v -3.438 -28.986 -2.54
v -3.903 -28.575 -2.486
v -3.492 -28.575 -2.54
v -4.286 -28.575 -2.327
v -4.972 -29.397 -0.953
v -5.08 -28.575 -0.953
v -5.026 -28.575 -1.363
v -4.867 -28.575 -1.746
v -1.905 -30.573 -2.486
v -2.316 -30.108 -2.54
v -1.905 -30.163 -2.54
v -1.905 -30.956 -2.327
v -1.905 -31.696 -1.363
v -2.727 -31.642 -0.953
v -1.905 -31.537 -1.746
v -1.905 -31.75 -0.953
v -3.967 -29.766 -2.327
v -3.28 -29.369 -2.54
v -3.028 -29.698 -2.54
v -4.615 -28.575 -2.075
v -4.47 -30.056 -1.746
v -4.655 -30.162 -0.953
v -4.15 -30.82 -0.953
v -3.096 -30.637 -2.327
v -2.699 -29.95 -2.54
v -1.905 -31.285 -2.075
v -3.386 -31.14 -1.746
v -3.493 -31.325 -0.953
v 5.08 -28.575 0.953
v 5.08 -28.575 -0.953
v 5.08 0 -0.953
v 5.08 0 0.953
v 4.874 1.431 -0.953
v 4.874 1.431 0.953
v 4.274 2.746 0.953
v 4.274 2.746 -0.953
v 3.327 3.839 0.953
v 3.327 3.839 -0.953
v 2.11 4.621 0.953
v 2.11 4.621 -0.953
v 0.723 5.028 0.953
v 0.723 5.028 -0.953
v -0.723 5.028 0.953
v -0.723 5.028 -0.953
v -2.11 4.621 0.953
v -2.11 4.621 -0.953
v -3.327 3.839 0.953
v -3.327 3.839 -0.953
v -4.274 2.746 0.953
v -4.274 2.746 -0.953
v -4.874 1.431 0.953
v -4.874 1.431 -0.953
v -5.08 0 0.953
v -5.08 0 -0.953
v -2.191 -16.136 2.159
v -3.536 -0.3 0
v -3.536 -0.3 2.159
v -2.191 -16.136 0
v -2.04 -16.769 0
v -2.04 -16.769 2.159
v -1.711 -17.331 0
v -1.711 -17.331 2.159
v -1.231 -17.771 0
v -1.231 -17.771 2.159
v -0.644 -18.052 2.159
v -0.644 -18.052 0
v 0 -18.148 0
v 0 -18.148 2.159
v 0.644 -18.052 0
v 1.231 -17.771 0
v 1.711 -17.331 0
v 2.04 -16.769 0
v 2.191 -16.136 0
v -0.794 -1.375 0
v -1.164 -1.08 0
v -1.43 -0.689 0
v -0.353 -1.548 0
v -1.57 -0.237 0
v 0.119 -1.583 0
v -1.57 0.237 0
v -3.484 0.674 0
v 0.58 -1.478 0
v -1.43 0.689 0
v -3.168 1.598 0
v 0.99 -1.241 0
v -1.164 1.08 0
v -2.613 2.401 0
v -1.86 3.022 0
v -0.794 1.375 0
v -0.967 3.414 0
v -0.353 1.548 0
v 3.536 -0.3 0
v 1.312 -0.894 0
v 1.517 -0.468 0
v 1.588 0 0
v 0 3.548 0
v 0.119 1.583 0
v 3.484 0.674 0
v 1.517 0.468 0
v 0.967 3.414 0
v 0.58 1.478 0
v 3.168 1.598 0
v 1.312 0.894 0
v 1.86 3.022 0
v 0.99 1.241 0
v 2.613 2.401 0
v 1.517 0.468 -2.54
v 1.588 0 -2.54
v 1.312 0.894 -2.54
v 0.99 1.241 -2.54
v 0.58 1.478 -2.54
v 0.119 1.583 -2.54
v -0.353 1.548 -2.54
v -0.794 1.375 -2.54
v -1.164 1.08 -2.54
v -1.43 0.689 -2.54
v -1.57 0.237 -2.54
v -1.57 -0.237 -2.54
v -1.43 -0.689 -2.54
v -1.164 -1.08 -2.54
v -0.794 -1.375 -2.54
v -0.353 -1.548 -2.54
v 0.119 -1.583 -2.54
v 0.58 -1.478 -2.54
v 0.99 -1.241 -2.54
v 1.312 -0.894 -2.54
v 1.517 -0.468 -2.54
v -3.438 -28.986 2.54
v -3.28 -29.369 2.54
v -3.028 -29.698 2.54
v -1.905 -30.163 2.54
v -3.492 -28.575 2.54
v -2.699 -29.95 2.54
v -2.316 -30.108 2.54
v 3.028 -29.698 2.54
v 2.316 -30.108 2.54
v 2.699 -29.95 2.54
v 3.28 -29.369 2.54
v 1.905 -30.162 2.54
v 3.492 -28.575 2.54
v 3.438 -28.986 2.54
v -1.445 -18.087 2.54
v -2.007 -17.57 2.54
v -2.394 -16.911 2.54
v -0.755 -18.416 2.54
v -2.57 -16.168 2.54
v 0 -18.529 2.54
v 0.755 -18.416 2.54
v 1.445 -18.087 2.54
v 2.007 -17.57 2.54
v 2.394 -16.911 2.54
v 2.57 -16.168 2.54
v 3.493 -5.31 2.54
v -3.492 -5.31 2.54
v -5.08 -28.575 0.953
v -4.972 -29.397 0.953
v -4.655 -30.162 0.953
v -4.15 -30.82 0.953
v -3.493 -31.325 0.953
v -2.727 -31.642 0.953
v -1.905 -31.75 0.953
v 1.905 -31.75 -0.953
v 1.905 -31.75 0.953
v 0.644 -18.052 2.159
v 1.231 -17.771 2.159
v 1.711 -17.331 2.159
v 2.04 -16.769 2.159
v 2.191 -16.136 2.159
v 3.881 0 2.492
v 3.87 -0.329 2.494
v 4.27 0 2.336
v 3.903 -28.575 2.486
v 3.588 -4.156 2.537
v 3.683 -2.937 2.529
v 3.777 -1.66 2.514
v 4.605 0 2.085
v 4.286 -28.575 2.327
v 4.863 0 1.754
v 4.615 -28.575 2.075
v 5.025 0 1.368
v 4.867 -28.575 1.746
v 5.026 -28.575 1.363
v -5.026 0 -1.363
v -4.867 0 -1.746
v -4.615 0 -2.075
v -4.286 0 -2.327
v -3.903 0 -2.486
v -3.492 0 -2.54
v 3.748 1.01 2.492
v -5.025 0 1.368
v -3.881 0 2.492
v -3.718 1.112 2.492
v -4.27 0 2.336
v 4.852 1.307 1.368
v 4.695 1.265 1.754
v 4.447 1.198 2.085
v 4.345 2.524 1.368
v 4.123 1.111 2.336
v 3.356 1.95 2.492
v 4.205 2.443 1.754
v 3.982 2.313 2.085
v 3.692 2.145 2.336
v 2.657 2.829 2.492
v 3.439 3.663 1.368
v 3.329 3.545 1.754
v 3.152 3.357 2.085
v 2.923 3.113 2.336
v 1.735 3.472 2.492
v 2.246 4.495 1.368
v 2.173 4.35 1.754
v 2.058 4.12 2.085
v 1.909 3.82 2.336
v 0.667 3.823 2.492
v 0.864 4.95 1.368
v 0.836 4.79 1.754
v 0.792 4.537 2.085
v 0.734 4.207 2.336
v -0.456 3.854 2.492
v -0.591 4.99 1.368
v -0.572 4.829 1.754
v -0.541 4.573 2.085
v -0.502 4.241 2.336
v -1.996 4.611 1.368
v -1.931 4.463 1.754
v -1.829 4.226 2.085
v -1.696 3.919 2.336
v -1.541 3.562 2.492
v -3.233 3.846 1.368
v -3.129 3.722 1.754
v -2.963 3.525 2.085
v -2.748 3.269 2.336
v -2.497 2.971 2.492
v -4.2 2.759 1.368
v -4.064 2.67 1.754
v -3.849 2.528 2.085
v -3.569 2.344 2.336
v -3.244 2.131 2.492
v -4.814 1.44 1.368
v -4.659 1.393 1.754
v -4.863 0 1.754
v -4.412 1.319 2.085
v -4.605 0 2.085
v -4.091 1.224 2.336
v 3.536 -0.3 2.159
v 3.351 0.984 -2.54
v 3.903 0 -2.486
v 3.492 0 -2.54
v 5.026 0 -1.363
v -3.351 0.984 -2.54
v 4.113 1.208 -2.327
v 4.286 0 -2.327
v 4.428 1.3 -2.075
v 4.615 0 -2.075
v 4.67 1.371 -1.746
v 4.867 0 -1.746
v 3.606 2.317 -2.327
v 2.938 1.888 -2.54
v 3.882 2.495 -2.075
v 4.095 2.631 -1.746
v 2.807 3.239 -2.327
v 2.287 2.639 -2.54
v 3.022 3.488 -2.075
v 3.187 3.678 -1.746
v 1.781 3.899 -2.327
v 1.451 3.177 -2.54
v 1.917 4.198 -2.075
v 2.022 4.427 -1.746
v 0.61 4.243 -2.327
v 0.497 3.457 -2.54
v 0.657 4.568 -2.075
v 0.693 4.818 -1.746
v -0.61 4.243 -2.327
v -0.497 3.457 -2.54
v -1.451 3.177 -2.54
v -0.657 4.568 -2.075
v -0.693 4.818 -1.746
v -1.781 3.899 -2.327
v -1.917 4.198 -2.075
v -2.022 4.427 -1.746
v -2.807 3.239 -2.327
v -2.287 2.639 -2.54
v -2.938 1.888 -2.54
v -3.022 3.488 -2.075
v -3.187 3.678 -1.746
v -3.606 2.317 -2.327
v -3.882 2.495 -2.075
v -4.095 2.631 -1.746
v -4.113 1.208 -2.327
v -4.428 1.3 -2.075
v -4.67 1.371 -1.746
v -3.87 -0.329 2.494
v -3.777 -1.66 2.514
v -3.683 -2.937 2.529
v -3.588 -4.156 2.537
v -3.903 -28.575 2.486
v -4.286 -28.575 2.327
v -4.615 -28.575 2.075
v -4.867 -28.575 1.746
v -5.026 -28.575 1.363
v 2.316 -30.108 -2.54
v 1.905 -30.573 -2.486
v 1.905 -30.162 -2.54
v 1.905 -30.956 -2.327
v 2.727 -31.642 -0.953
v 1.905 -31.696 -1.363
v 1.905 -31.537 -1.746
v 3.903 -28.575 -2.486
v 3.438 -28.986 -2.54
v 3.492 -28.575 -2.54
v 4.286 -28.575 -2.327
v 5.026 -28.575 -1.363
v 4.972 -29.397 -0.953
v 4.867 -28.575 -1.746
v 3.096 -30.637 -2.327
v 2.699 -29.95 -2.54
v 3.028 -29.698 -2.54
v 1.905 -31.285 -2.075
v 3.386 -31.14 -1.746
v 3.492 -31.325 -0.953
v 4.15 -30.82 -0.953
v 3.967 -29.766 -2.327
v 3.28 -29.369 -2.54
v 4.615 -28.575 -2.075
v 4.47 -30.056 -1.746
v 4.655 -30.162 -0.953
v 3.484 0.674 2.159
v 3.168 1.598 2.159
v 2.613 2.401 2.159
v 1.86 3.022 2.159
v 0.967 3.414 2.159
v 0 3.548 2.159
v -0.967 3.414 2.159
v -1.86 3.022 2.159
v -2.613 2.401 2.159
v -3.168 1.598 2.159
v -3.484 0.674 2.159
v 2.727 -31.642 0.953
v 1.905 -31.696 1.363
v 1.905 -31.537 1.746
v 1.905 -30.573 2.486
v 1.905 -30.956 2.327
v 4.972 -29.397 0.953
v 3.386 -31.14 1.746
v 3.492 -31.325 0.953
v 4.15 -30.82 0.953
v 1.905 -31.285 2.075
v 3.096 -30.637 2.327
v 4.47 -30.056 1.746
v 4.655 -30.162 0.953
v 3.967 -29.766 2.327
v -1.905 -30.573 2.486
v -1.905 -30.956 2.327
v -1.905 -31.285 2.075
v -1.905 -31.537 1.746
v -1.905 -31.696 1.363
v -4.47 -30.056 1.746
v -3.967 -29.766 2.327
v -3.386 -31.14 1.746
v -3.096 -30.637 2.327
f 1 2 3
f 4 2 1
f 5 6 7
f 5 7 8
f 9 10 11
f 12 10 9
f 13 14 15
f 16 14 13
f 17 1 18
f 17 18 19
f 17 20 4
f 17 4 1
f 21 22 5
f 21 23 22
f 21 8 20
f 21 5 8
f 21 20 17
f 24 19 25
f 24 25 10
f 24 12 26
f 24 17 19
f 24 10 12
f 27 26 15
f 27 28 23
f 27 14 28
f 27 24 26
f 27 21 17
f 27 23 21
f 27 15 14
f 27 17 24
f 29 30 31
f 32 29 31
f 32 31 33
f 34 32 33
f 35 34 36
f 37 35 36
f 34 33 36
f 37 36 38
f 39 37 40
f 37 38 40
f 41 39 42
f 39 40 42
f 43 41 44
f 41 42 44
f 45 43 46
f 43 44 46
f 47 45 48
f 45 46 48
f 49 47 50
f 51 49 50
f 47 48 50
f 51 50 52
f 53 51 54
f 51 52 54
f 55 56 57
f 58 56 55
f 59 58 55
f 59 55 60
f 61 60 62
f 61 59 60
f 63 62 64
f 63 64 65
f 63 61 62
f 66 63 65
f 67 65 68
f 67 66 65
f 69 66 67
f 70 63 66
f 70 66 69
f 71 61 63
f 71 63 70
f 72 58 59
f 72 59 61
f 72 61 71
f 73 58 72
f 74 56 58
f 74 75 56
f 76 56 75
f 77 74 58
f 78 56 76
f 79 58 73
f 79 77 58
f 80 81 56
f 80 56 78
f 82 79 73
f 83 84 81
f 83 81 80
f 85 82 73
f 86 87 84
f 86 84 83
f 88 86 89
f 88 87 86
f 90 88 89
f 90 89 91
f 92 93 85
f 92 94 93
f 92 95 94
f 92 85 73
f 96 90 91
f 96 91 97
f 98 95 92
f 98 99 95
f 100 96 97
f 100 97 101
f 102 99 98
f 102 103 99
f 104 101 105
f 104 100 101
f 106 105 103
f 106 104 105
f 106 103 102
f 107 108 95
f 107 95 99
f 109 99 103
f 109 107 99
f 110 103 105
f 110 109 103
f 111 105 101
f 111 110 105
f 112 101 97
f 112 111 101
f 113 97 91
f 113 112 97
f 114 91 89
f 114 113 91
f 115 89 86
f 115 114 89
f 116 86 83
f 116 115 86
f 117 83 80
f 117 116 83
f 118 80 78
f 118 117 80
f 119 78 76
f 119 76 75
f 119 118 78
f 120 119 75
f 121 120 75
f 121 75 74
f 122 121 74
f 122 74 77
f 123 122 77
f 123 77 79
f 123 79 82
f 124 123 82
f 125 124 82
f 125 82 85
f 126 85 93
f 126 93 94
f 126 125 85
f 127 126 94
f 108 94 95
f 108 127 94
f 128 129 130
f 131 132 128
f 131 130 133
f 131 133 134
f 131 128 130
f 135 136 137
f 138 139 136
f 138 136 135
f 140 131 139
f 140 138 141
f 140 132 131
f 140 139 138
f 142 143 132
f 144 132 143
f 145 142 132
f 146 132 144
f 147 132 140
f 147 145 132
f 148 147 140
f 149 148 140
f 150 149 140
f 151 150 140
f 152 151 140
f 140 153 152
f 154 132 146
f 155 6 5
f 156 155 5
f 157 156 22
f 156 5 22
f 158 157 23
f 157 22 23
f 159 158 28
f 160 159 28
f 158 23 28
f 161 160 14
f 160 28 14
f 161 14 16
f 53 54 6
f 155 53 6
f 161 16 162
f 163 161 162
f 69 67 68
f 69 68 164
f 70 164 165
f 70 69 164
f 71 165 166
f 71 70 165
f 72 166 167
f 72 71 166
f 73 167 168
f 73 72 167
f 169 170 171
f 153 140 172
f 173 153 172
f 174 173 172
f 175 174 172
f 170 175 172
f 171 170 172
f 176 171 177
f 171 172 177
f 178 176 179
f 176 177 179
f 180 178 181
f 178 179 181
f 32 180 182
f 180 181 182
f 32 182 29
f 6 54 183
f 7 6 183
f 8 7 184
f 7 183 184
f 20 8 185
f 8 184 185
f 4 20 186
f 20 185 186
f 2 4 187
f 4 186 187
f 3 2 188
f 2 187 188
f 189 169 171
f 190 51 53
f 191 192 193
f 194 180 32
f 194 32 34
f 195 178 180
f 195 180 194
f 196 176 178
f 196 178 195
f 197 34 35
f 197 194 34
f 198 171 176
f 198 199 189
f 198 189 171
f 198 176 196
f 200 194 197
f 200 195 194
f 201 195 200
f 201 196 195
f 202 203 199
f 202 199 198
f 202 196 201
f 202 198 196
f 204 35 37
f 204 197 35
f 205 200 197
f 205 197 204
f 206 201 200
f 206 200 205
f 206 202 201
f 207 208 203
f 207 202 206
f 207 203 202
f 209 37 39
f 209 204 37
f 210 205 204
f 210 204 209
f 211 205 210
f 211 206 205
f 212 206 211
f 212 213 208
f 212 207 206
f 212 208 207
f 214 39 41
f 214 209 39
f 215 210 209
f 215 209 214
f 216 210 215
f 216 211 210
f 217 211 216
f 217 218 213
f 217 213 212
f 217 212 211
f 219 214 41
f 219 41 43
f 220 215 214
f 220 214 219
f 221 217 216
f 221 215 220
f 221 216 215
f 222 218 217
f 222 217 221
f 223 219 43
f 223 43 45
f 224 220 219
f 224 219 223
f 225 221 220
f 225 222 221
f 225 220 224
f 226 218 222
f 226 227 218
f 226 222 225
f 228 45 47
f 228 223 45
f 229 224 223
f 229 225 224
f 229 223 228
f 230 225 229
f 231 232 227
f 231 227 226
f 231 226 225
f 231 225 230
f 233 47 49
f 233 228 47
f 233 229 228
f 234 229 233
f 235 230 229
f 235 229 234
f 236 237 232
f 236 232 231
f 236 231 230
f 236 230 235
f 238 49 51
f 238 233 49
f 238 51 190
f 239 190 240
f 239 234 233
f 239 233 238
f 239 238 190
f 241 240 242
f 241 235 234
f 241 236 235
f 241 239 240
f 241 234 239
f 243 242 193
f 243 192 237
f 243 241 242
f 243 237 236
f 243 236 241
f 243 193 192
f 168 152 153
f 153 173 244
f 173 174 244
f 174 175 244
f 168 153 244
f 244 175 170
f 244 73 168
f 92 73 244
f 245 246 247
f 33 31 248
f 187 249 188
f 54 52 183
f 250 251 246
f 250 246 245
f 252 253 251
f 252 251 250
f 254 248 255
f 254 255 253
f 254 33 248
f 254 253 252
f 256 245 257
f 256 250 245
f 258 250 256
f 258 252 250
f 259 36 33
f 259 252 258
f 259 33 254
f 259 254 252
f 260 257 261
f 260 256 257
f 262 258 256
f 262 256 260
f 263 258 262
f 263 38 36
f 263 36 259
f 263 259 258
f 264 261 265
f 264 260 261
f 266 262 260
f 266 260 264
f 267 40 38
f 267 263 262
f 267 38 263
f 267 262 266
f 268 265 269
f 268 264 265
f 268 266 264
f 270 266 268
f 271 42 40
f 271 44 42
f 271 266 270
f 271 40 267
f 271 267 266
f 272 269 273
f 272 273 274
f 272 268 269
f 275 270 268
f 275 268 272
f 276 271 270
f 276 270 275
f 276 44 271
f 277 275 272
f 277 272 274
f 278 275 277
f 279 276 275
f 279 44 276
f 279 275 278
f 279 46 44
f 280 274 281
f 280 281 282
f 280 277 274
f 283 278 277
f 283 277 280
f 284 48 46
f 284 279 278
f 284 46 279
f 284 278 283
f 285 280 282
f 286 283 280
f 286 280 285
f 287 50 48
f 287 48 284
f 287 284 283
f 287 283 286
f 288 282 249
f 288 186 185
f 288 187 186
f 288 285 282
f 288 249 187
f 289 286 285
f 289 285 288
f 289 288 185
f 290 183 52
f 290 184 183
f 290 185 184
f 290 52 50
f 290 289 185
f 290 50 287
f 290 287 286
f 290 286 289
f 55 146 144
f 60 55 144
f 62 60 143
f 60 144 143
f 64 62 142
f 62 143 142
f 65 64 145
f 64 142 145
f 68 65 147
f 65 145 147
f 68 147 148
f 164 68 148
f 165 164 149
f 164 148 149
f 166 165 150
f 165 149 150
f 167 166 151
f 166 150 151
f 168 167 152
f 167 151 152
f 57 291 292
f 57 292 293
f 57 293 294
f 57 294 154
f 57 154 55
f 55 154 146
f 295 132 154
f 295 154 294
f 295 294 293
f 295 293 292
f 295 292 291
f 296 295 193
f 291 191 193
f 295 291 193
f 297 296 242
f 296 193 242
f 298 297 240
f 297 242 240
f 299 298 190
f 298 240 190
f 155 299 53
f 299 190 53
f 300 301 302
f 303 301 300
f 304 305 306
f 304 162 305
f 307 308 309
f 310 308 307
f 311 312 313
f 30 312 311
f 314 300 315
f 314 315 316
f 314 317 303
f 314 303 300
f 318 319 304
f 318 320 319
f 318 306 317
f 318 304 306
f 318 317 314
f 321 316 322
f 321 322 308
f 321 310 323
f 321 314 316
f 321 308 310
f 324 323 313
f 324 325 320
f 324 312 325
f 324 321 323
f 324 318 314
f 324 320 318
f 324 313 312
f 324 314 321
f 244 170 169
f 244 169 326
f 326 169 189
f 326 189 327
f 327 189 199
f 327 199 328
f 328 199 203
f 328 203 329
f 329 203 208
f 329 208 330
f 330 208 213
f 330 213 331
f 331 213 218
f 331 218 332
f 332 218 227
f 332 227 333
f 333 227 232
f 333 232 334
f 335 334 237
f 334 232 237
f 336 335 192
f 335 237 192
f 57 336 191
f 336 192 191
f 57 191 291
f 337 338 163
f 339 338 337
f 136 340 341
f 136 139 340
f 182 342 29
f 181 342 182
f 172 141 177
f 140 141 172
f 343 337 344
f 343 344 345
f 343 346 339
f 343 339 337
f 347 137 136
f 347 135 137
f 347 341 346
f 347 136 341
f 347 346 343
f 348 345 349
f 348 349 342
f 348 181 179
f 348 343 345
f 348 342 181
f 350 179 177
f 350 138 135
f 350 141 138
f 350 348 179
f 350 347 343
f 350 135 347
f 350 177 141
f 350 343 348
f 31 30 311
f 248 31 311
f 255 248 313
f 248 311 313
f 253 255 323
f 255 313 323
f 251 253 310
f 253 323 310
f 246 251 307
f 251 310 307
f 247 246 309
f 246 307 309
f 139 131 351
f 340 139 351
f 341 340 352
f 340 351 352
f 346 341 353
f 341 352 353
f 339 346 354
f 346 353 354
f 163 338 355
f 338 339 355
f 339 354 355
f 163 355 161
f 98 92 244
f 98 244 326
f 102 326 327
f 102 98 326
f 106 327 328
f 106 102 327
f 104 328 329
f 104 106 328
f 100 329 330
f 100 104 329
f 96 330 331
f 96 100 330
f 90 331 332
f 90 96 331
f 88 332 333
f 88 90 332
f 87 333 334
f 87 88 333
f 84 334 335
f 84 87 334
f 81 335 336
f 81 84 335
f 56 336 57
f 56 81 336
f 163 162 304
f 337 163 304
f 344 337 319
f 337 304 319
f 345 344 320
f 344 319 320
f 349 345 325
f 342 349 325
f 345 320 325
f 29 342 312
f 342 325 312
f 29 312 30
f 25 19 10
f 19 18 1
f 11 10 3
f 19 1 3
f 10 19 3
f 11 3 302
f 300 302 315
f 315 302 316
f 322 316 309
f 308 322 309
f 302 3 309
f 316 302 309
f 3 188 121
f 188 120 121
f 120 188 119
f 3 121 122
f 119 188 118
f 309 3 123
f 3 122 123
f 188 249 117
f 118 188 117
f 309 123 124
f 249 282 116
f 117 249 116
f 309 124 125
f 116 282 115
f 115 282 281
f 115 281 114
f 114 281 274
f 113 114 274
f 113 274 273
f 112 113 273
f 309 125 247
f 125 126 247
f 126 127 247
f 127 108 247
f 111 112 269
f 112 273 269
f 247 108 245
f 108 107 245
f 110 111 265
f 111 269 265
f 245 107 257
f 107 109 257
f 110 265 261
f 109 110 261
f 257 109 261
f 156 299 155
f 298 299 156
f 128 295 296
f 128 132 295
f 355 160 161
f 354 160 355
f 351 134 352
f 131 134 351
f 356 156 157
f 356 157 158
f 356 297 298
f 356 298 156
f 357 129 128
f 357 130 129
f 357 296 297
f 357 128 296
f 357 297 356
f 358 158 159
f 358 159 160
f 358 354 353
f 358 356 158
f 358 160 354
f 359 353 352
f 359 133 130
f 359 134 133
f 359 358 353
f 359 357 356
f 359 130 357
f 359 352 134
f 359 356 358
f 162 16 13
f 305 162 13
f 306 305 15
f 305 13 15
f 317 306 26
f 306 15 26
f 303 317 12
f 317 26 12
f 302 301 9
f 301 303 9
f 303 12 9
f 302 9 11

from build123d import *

# Parameters (mm, degrees)
BOSS_EXTRUDE1_DEPTH = 2.54
BOSS_EXTRUDE2_START = -2.54
SKETCH1_3_R         = 1.5875
BOSS_EXTRUDE2_DEPTH = 2.54
CHAMFER1_SIZE       = 0.381
FILLET1_R           = 1.5875


with BuildPart() as part:
    # Sketch1 → Boss-Extrude1 (new body)
    with BuildSketch(Plane.XY):
        with BuildLine():
            Line((5.08, -28.575), (5.08, 0))
            ThreePointArc((5.08, 0), (0, 5.08), (-5.08, 0))
            Line((-5.08, 0), (-5.08, -28.575))
            ThreePointArc((-5.08, -28.575), (-4.15006403, -30.82006403), (-1.905, -31.75))
            Line((-1.905, -31.75), (1.905, -31.75))
            ThreePointArc((1.905, -31.75), (4.15006403, -30.82006403), (5.08, -28.575))
        make_face()
        with BuildLine():
            Line((-3.535704427, -0.30033797), (-2.190548714, -16.136074647))
            ThreePointArc((-2.190548714, -16.136074647), (-1.487288465, -17.568981304), (0, -18.1484375))
            ThreePointArc((0, -18.1484375), (1.487288465, -17.568981304), (2.190548714, -16.136074647))
            Line((2.190548714, -16.136074647), (3.535704427, -0.30033797))
            ThreePointArc((3.535704427, -0.30033797), (0, 3.5484375), (-3.535704427, -0.30033797))
        make_face(mode=Mode.SUBTRACT)
    extrude(amount=BOSS_EXTRUDE1_DEPTH)

    # Sketch1<3> → Boss-Extrude2 (add)
    with BuildSketch(Plane.XY.offset(BOSS_EXTRUDE2_START)):
        with BuildLine():
            ThreePointArc((1.905, -31.75), (4.15006403, -30.82006403), (5.08, -28.575))
            Line((5.08, -28.575), (5.08, 0))
            ThreePointArc((5.08, 0), (0, 5.08), (-5.08, 0))
            Line((-5.08, 0), (-5.08, -28.575))
            ThreePointArc((-5.08, -28.575), (-4.15006403, -30.82006403), (-1.905, -31.75))
            Line((-1.905, -31.75), (1.905, -31.75))
        make_face()
        Circle(SKETCH1_3_R, mode=Mode.SUBTRACT)
    extrude(amount=BOSS_EXTRUDE2_DEPTH)

    # Chamfer1
    chamfer1_edges = [part.edges().sort_by_distance(p)[0] for p in [
        (0, 3.5484375, 2.54),
        (2.86312657, -8.218206309, 2.54),
        (0, -18.1484375, 2.54),
        (-2.86312657, -8.218206309, 2.54),
    ]]
    chamfer(chamfer1_edges, length=CHAMFER1_SIZE)

    # Fillet1
    # the kernel refuses this fillet: 1.5875 mm, written as the material it takes off along each edge
    with BuildSketch(Plane(origin=(1.905, -28.575, 2.54), x_dir=(0, -1, 0), z_dir=(-1, 0, 0))) as fillet1_piece_1:
        with BuildLine():
            CenterArc((3.175 - FILLET1_R, -FILLET1_R), FILLET1_R, 0, 90)
            Line((3.175, -FILLET1_R), (3.175, 0))
            Line((3.175, 0), (3.175 - FILLET1_R, 0))
        make_face()
    revolve(axis=Axis((1.905, -28.575, 2.54), (0, 0, 1)), revolution_arc=90, mode=Mode.SUBTRACT)
    with BuildSketch(Plane(origin=(-1.905, -28.575, 2.54), x_dir=(-1, 0, 0), z_dir=(0, 1, 0))) as fillet1_piece_2:
        with BuildLine():
            CenterArc((3.175 - FILLET1_R, -FILLET1_R), FILLET1_R, 0, 90)
            Line((3.175, -FILLET1_R), (3.175, 0))
            Line((3.175, 0), (3.175 - FILLET1_R, 0))
        make_face()
    revolve(axis=Axis((-1.905, -28.575, 2.54), (0, 0, 1)), revolution_arc=90, mode=Mode.SUBTRACT)
    with BuildSketch(Plane(origin=(-5.08, 0, 2.54), x_dir=(1, 0, 0), z_dir=(0, -1, 0)), Plane(origin=(-5.08, 0, -2.54), x_dir=(0, 0, 1), z_dir=(0, -1, 0)), Plane(origin=(5.08, -28.575, 2.54), x_dir=(-1, 0, 0), z_dir=(0, 1, 0)), Plane(origin=(5.08, -28.575, -2.54), x_dir=(0, 0, 1), z_dir=(0, 1, 0))) as fillet1_piece_3:
        with BuildLine():
            CenterArc((FILLET1_R, -FILLET1_R), FILLET1_R, 90, 90)
            Line((0, -FILLET1_R), (0, 0))
            Line((0, 0), (FILLET1_R, 0))
        make_face()
    extrude(amount=28.575, mode=Mode.SUBTRACT)
    with BuildSketch(Plane(origin=(1.905, -28.575, -2.54), x_dir=(0, -1, 0), z_dir=(-1, 0, 0))) as fillet1_piece_4:
        with BuildLine():
            CenterArc((3.175 - FILLET1_R, FILLET1_R), FILLET1_R, 270, 90)
            Line((3.175 - FILLET1_R, 0), (3.175, 0))
            Line((3.175, 0), (3.175, FILLET1_R))
        make_face()
    revolve(axis=Axis((1.905, -28.575, -2.54), (0, 0, 1)), revolution_arc=90, mode=Mode.SUBTRACT)
    with BuildSketch(Plane(origin=(-1.905, -28.575, -2.54), x_dir=(-1, 0, 0), z_dir=(0, 1, 0))) as fillet1_piece_5:
        with BuildLine():
            CenterArc((3.175 - FILLET1_R, FILLET1_R), FILLET1_R, 270, 90)
            Line((3.175 - FILLET1_R, 0), (3.175, 0))
            Line((3.175, 0), (3.175, FILLET1_R))
        make_face()
    revolve(axis=Axis((-1.905, -28.575, -2.54), (0, 0, 1)), revolution_arc=90, mode=Mode.SUBTRACT)
    with BuildSketch(Plane(origin=(0, 0, -2.54), x_dir=(1, 0, 0), z_dir=(0, -1, 0))) as fillet1_piece_6:
        with BuildLine():
            CenterArc((5.08 - FILLET1_R, FILLET1_R), FILLET1_R, 270, 90)
            Line((5.08 - FILLET1_R, 0), (5.08, 0))
            Line((5.08, 0), (5.08, FILLET1_R))
        make_face()
    revolve(axis=Axis((0, 0, -2.54), (0, 0, 1)), revolution_arc=180, mode=Mode.SUBTRACT)
    with BuildSketch(Plane(origin=(0, 0, 2.54), x_dir=(1, 0, 0), z_dir=(0, -1, 0))) as fillet1_piece_7:
        with BuildLine():
            CenterArc((5.08 - FILLET1_R, -FILLET1_R), FILLET1_R, 0, 90)
            Line((5.08, -FILLET1_R), (5.08, 0))
            Line((5.08, 0), (5.08 - FILLET1_R, 0))
        make_face()
    revolve(axis=Axis((0, 0, 2.54), (0, 0, 1)), revolution_arc=180, mode=Mode.SUBTRACT)
    with BuildSketch(Plane(origin=(-1.905, -31.75, 2.54), x_dir=(0, 1, 0), z_dir=(1, 0, 0)), Plane(origin=(-1.905, -31.75, -2.54), x_dir=(0, 0, 1), z_dir=(1, 0, 0))) as fillet1_piece_8:
        with BuildLine():
            CenterArc((FILLET1_R, -FILLET1_R), FILLET1_R, 90, 90)
            Line((0, -FILLET1_R), (0, 0))
            Line((0, 0), (FILLET1_R, 0))
        make_face()
    extrude(amount=3.81, mode=Mode.SUBTRACT)


solid = part.part
